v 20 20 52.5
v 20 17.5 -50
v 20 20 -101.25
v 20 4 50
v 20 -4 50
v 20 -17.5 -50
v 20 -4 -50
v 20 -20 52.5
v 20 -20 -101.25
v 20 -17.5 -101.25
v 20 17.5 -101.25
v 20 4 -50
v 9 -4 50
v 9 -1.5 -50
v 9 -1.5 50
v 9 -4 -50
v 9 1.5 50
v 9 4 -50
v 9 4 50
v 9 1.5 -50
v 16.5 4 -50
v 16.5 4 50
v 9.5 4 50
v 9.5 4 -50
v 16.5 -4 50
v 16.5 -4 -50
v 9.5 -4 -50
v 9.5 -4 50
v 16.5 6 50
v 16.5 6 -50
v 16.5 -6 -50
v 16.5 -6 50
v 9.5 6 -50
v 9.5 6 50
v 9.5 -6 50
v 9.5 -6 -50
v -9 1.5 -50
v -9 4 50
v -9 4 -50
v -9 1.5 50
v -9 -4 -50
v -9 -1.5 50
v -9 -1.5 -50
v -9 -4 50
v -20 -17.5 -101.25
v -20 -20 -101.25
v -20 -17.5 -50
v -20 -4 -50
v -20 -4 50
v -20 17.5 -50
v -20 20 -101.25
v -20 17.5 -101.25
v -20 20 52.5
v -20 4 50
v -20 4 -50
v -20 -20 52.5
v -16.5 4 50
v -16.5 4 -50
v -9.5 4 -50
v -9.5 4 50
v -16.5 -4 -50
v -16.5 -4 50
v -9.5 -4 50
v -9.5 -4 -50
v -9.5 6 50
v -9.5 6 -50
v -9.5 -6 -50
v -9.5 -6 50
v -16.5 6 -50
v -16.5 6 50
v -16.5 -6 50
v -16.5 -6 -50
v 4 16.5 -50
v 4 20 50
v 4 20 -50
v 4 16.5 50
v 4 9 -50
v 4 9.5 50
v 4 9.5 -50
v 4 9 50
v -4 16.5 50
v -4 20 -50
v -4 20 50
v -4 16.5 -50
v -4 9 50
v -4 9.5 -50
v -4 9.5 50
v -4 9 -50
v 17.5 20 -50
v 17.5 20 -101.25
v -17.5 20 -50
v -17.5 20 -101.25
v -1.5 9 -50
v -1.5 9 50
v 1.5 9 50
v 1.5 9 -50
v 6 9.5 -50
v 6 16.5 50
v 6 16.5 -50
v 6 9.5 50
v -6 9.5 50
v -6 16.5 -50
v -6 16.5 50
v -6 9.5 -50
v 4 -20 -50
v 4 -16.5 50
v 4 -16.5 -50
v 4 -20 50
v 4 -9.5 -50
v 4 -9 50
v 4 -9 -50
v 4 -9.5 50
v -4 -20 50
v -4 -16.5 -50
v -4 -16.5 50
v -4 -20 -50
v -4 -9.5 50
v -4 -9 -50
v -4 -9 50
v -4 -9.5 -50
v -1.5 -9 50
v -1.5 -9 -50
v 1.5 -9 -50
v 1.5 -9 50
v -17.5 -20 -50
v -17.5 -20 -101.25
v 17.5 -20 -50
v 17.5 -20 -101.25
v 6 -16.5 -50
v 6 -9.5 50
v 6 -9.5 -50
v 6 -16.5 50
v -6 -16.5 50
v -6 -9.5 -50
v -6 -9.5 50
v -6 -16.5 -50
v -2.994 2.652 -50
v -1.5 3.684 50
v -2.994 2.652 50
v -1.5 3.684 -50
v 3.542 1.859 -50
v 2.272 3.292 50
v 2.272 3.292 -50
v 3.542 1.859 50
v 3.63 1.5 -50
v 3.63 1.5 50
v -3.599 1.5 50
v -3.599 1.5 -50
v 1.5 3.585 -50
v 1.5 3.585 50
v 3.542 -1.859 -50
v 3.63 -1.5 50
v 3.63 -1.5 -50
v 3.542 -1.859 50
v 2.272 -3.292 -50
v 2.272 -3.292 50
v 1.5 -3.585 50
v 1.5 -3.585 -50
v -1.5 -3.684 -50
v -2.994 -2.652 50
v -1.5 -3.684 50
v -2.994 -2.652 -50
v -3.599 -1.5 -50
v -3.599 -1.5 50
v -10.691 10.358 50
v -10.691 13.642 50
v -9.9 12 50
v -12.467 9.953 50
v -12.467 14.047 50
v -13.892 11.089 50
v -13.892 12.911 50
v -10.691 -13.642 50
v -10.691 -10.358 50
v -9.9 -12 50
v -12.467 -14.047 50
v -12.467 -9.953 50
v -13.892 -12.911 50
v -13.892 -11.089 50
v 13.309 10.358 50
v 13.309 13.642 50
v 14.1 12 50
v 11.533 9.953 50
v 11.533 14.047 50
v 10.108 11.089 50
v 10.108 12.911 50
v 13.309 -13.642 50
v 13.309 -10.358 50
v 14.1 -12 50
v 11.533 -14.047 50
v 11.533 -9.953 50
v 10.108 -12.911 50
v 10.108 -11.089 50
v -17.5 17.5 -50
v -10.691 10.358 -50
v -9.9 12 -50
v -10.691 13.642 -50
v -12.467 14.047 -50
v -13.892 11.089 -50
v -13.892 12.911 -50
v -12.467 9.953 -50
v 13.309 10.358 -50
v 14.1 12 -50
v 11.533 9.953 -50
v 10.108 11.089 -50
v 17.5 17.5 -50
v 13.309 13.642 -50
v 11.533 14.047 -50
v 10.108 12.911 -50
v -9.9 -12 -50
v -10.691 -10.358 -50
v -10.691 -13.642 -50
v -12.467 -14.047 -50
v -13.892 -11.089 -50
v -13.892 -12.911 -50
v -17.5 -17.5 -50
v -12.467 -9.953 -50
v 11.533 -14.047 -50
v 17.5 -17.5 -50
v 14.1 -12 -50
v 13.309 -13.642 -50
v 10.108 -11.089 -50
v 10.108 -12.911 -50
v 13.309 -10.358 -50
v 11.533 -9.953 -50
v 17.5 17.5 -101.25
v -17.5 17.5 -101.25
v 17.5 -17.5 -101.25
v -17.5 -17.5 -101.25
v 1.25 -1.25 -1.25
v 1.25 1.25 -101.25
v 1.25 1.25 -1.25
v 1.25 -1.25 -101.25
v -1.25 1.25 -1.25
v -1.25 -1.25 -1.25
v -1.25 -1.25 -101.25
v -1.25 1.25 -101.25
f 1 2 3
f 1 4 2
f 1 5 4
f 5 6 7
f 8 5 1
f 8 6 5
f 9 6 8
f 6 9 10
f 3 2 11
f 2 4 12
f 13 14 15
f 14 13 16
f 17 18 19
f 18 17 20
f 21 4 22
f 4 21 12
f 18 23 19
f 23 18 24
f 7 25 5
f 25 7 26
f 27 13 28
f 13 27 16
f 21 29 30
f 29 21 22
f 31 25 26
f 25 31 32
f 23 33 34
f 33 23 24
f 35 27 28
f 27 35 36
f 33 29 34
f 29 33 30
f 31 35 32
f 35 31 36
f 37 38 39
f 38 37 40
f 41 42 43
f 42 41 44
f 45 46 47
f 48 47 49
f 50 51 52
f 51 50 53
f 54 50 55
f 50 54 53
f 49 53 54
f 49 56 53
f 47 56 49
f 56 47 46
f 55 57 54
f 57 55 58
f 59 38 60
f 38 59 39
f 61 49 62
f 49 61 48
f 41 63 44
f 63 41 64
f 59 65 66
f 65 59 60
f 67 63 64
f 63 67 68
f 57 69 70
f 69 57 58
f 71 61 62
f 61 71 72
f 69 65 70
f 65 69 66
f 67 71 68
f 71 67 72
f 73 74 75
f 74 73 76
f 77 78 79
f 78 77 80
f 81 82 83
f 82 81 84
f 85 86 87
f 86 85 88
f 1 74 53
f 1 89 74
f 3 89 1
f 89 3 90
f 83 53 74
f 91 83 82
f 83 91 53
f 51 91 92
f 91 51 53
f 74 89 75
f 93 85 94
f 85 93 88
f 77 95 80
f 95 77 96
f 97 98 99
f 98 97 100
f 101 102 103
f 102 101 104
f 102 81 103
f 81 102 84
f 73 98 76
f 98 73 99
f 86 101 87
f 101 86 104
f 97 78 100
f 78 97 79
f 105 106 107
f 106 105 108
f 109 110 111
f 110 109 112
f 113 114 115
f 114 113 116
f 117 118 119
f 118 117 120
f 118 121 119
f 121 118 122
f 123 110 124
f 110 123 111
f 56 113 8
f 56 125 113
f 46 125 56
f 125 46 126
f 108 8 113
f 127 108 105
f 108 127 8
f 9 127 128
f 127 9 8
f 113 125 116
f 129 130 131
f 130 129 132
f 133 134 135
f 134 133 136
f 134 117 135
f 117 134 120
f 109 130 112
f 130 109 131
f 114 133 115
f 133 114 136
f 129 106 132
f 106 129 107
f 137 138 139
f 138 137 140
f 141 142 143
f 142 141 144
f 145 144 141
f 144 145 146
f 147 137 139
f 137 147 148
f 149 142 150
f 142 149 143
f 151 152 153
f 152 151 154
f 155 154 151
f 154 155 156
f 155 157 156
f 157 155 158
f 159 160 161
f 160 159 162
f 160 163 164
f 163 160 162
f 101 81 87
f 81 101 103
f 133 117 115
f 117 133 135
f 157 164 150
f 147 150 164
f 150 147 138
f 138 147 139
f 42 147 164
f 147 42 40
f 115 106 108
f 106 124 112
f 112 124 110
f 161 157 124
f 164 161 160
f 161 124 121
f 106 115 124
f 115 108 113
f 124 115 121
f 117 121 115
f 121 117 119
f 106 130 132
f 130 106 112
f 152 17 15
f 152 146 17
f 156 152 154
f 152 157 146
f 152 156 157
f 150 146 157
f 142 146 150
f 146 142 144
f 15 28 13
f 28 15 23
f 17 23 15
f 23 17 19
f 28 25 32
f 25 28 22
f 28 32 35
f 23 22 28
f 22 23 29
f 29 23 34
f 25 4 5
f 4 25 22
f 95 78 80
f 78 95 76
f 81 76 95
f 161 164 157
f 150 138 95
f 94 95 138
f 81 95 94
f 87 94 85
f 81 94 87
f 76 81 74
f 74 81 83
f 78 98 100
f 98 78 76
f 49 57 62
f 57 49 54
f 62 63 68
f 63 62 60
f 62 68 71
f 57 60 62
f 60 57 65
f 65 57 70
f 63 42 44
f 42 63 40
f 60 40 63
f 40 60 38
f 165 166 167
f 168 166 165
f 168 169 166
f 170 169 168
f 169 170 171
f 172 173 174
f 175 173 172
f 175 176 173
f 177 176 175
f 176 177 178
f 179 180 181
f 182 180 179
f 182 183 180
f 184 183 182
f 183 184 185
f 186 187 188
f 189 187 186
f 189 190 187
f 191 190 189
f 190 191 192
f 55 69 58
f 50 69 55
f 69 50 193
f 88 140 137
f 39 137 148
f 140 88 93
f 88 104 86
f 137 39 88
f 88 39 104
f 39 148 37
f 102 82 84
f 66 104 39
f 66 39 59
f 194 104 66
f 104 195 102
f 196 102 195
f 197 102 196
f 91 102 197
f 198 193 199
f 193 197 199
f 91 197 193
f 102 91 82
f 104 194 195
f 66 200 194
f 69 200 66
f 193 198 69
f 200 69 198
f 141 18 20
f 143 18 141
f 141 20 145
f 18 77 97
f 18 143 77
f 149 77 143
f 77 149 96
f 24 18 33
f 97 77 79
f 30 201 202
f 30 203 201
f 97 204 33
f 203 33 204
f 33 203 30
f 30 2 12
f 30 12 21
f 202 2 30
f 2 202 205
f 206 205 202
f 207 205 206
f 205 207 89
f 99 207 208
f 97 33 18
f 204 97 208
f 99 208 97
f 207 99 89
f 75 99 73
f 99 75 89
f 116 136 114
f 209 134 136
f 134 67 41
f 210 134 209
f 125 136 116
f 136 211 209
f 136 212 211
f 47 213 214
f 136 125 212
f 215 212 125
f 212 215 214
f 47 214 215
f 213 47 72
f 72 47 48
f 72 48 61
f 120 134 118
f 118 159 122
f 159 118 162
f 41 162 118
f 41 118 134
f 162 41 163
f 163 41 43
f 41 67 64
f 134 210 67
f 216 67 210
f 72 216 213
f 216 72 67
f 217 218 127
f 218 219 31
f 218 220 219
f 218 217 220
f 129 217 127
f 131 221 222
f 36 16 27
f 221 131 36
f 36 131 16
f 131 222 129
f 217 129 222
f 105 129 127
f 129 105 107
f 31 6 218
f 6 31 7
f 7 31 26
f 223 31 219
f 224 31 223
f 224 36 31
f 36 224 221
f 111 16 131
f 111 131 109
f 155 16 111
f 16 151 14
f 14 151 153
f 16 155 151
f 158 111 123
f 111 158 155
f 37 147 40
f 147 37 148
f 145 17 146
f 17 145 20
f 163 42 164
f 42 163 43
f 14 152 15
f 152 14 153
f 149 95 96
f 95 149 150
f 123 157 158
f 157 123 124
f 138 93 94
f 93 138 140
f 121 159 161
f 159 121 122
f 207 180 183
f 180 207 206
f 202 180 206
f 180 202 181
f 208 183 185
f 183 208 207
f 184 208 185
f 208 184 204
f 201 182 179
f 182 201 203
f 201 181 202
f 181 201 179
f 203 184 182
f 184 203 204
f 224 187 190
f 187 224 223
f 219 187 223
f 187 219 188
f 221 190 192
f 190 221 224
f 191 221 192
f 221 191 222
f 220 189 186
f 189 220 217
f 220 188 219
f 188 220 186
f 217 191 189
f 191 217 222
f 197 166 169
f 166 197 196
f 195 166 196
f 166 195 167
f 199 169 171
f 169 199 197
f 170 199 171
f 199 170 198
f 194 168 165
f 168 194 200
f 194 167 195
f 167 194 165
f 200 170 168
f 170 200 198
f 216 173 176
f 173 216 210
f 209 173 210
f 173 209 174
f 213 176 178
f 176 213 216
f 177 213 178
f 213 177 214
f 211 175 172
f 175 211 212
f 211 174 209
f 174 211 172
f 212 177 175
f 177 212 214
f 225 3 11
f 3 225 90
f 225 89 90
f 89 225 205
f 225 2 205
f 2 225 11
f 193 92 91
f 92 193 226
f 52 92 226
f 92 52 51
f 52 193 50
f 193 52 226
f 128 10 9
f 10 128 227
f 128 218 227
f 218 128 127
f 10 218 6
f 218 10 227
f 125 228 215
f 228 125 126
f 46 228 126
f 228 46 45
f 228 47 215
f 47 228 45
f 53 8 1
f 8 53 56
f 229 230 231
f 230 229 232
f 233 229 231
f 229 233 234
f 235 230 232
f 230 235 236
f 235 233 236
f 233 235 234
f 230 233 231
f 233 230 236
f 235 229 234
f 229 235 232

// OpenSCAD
// Parameters
profile_width = 40; //[20:80:1]
profile_height = 40; //[20:80:1]
length = 100; //[50:200:1]
center = 1; //[0:1:1]
cornerHole = 1; //[0:1:1]
eps = 1; //[0.2:2:0.1]
outer_fillet_r = 2; //[0:6:0.5]
wall = 2.5; //[1.5:5:0.1]
slot_opening = 8; //[4:14:0.5]
slot_neck = 6; //[3:12:0.5]
slot_depth = 10; //[6:16:0.5]
slot_head_width = 12; //[8:18:0.5]
slot_head_depth = 6; //[3:10:0.5]
center_bore_d = 8; //[4:16:0.5]
web_thickness = 3; //[1.5:6:0.5]
corner_hole_d = 4.2; //[0:8:0.1]
corner_hole_inset = 8; //[5:14:0.5]

// Extrusion - complete geometry
module extrusion() {
  color("Silver") {
    difference() {
      // Outer body
      cube([profile_width, profile_height, length], center=true);
      
      // T-slot channels
      union() {
        translate([profile_width/2 - (slot_depth + eps)/2, 0, 0])
          cube([slot_depth + eps, slot_opening, length + 2*eps], center=true);
        translate([profile_width/2 - slot_depth + slot_head_depth/2, 0, 0])
          cube([slot_head_depth + eps, slot_head_width, length + 2*eps], center=true);
        translate([-profile_width/2 + (slot_depth + eps)/2, 0, 0])
          cube([slot_depth + eps, slot_opening, length + 2*eps], center=true);
        translate([-profile_width/2 + slot_depth - slot_head_depth/2, 0, 0])
          cube([slot_head_depth + eps, slot_head_width, length + 2*eps], center=true);
        translate([0, profile_height/2 - (slot_depth + eps)/2, 0])
          cube([slot_opening, slot_depth + eps, length + 2*eps], center=true);
        translate([0, profile_height/2 - slot_depth + slot_head_depth/2, 0])
          cube([slot_head_width, slot_head_depth + eps, length + 2*eps], center=true);
        translate([0, -profile_height/2 + (slot_depth + eps)/2, 0])
          cube([slot_opening, slot_depth + eps, length + 2*eps], center=true);
        translate([0, -profile_height/2 + slot_depth - slot_head_depth/2, 0])
          cube([slot_head_width, slot_head_depth + eps, length + 2*eps], center=true);
      }
      
      // Center bore and internal webs
      union() {
        cylinder(r=center_bore_d/2, h=length + 2*eps, center=true);
        cube([profile_width - 2*(slot_depth - slot_head_depth) - 2*wall, web_thickness, length], center=true);
        cube([web_thickness, profile_height - 2*(slot_depth - slot_head_depth) - 2*wall, length], center=true);
      }
      
      // Corner holes
      if (cornerHole) {
        union() {
          translate([profile_width/2 - corner_hole_inset, profile_height/2 - corner_hole_inset, 0])
            cylinder(r=corner_hole_d/2, h=length + 2*eps, center=true);
          translate([profile_width/2 - corner_hole_inset, -profile_height/2 + corner_hole_inset, 0])
            cylinder(r=corner_hole_d/2, h=length + 2*eps, center=true);
          translate([-profile_width/2 + corner_hole_inset, profile_height/2 - corner_hole_inset, 0])
            cylinder(r=corner_hole_d/2, h=length + 2*eps, center=true);
          translate([-profile_width/2 + corner_hole_inset, -profile_height/2 + corner_hole_inset, 0])
            cylinder(r=corner_hole_d/2, h=length + 2*eps, center=true);
        }
      }
    }
  }
}

// Extrusion Cross Section - complete geometry
module extrusion_cross_section() {
  color("DimGray") {
    cube([profile_width, profile_height, wall], center=true);
  }
}

// Box Corner Profile Section - complete geometry
module box_corner_profile_section() {
  color("Black") {
    cube([wall, wall, length], center=true);
  }
}

// Box Corner Profile Sections - complete geometry
module box_corner_profile_sections() {
  color("Black") {
    union() {
      translate([profile_width/2 - wall/2, profile_height/2 - wall/2, 0])
        cube([wall, wall, length], center=true);
      translate([-profile_width/2 + wall/2, profile_height/2 - wall/2, 0])
        cube([wall, wall, length], center=true);
      translate([profile_width/2 - wall/2, -profile_height/2 + wall/2, 0])
        cube([wall, wall, length], center=true);
      translate([-profile_width/2 + wall/2, -profile_height/2 + wall/2, 0])
        cube([wall, wall, length], center=true);
    }
  }
}

// Assembly
module assembly() {
  extrusion();
  translate([0, 0, length/2 + wall/2]) extrusion_cross_section();
  translate([0, 0, -length/2 - wall/2]) box_corner_profile_section();
  translate([0, 0, -length/2 - wall/2]) box_corner_profile_sections();
}

assembly();
